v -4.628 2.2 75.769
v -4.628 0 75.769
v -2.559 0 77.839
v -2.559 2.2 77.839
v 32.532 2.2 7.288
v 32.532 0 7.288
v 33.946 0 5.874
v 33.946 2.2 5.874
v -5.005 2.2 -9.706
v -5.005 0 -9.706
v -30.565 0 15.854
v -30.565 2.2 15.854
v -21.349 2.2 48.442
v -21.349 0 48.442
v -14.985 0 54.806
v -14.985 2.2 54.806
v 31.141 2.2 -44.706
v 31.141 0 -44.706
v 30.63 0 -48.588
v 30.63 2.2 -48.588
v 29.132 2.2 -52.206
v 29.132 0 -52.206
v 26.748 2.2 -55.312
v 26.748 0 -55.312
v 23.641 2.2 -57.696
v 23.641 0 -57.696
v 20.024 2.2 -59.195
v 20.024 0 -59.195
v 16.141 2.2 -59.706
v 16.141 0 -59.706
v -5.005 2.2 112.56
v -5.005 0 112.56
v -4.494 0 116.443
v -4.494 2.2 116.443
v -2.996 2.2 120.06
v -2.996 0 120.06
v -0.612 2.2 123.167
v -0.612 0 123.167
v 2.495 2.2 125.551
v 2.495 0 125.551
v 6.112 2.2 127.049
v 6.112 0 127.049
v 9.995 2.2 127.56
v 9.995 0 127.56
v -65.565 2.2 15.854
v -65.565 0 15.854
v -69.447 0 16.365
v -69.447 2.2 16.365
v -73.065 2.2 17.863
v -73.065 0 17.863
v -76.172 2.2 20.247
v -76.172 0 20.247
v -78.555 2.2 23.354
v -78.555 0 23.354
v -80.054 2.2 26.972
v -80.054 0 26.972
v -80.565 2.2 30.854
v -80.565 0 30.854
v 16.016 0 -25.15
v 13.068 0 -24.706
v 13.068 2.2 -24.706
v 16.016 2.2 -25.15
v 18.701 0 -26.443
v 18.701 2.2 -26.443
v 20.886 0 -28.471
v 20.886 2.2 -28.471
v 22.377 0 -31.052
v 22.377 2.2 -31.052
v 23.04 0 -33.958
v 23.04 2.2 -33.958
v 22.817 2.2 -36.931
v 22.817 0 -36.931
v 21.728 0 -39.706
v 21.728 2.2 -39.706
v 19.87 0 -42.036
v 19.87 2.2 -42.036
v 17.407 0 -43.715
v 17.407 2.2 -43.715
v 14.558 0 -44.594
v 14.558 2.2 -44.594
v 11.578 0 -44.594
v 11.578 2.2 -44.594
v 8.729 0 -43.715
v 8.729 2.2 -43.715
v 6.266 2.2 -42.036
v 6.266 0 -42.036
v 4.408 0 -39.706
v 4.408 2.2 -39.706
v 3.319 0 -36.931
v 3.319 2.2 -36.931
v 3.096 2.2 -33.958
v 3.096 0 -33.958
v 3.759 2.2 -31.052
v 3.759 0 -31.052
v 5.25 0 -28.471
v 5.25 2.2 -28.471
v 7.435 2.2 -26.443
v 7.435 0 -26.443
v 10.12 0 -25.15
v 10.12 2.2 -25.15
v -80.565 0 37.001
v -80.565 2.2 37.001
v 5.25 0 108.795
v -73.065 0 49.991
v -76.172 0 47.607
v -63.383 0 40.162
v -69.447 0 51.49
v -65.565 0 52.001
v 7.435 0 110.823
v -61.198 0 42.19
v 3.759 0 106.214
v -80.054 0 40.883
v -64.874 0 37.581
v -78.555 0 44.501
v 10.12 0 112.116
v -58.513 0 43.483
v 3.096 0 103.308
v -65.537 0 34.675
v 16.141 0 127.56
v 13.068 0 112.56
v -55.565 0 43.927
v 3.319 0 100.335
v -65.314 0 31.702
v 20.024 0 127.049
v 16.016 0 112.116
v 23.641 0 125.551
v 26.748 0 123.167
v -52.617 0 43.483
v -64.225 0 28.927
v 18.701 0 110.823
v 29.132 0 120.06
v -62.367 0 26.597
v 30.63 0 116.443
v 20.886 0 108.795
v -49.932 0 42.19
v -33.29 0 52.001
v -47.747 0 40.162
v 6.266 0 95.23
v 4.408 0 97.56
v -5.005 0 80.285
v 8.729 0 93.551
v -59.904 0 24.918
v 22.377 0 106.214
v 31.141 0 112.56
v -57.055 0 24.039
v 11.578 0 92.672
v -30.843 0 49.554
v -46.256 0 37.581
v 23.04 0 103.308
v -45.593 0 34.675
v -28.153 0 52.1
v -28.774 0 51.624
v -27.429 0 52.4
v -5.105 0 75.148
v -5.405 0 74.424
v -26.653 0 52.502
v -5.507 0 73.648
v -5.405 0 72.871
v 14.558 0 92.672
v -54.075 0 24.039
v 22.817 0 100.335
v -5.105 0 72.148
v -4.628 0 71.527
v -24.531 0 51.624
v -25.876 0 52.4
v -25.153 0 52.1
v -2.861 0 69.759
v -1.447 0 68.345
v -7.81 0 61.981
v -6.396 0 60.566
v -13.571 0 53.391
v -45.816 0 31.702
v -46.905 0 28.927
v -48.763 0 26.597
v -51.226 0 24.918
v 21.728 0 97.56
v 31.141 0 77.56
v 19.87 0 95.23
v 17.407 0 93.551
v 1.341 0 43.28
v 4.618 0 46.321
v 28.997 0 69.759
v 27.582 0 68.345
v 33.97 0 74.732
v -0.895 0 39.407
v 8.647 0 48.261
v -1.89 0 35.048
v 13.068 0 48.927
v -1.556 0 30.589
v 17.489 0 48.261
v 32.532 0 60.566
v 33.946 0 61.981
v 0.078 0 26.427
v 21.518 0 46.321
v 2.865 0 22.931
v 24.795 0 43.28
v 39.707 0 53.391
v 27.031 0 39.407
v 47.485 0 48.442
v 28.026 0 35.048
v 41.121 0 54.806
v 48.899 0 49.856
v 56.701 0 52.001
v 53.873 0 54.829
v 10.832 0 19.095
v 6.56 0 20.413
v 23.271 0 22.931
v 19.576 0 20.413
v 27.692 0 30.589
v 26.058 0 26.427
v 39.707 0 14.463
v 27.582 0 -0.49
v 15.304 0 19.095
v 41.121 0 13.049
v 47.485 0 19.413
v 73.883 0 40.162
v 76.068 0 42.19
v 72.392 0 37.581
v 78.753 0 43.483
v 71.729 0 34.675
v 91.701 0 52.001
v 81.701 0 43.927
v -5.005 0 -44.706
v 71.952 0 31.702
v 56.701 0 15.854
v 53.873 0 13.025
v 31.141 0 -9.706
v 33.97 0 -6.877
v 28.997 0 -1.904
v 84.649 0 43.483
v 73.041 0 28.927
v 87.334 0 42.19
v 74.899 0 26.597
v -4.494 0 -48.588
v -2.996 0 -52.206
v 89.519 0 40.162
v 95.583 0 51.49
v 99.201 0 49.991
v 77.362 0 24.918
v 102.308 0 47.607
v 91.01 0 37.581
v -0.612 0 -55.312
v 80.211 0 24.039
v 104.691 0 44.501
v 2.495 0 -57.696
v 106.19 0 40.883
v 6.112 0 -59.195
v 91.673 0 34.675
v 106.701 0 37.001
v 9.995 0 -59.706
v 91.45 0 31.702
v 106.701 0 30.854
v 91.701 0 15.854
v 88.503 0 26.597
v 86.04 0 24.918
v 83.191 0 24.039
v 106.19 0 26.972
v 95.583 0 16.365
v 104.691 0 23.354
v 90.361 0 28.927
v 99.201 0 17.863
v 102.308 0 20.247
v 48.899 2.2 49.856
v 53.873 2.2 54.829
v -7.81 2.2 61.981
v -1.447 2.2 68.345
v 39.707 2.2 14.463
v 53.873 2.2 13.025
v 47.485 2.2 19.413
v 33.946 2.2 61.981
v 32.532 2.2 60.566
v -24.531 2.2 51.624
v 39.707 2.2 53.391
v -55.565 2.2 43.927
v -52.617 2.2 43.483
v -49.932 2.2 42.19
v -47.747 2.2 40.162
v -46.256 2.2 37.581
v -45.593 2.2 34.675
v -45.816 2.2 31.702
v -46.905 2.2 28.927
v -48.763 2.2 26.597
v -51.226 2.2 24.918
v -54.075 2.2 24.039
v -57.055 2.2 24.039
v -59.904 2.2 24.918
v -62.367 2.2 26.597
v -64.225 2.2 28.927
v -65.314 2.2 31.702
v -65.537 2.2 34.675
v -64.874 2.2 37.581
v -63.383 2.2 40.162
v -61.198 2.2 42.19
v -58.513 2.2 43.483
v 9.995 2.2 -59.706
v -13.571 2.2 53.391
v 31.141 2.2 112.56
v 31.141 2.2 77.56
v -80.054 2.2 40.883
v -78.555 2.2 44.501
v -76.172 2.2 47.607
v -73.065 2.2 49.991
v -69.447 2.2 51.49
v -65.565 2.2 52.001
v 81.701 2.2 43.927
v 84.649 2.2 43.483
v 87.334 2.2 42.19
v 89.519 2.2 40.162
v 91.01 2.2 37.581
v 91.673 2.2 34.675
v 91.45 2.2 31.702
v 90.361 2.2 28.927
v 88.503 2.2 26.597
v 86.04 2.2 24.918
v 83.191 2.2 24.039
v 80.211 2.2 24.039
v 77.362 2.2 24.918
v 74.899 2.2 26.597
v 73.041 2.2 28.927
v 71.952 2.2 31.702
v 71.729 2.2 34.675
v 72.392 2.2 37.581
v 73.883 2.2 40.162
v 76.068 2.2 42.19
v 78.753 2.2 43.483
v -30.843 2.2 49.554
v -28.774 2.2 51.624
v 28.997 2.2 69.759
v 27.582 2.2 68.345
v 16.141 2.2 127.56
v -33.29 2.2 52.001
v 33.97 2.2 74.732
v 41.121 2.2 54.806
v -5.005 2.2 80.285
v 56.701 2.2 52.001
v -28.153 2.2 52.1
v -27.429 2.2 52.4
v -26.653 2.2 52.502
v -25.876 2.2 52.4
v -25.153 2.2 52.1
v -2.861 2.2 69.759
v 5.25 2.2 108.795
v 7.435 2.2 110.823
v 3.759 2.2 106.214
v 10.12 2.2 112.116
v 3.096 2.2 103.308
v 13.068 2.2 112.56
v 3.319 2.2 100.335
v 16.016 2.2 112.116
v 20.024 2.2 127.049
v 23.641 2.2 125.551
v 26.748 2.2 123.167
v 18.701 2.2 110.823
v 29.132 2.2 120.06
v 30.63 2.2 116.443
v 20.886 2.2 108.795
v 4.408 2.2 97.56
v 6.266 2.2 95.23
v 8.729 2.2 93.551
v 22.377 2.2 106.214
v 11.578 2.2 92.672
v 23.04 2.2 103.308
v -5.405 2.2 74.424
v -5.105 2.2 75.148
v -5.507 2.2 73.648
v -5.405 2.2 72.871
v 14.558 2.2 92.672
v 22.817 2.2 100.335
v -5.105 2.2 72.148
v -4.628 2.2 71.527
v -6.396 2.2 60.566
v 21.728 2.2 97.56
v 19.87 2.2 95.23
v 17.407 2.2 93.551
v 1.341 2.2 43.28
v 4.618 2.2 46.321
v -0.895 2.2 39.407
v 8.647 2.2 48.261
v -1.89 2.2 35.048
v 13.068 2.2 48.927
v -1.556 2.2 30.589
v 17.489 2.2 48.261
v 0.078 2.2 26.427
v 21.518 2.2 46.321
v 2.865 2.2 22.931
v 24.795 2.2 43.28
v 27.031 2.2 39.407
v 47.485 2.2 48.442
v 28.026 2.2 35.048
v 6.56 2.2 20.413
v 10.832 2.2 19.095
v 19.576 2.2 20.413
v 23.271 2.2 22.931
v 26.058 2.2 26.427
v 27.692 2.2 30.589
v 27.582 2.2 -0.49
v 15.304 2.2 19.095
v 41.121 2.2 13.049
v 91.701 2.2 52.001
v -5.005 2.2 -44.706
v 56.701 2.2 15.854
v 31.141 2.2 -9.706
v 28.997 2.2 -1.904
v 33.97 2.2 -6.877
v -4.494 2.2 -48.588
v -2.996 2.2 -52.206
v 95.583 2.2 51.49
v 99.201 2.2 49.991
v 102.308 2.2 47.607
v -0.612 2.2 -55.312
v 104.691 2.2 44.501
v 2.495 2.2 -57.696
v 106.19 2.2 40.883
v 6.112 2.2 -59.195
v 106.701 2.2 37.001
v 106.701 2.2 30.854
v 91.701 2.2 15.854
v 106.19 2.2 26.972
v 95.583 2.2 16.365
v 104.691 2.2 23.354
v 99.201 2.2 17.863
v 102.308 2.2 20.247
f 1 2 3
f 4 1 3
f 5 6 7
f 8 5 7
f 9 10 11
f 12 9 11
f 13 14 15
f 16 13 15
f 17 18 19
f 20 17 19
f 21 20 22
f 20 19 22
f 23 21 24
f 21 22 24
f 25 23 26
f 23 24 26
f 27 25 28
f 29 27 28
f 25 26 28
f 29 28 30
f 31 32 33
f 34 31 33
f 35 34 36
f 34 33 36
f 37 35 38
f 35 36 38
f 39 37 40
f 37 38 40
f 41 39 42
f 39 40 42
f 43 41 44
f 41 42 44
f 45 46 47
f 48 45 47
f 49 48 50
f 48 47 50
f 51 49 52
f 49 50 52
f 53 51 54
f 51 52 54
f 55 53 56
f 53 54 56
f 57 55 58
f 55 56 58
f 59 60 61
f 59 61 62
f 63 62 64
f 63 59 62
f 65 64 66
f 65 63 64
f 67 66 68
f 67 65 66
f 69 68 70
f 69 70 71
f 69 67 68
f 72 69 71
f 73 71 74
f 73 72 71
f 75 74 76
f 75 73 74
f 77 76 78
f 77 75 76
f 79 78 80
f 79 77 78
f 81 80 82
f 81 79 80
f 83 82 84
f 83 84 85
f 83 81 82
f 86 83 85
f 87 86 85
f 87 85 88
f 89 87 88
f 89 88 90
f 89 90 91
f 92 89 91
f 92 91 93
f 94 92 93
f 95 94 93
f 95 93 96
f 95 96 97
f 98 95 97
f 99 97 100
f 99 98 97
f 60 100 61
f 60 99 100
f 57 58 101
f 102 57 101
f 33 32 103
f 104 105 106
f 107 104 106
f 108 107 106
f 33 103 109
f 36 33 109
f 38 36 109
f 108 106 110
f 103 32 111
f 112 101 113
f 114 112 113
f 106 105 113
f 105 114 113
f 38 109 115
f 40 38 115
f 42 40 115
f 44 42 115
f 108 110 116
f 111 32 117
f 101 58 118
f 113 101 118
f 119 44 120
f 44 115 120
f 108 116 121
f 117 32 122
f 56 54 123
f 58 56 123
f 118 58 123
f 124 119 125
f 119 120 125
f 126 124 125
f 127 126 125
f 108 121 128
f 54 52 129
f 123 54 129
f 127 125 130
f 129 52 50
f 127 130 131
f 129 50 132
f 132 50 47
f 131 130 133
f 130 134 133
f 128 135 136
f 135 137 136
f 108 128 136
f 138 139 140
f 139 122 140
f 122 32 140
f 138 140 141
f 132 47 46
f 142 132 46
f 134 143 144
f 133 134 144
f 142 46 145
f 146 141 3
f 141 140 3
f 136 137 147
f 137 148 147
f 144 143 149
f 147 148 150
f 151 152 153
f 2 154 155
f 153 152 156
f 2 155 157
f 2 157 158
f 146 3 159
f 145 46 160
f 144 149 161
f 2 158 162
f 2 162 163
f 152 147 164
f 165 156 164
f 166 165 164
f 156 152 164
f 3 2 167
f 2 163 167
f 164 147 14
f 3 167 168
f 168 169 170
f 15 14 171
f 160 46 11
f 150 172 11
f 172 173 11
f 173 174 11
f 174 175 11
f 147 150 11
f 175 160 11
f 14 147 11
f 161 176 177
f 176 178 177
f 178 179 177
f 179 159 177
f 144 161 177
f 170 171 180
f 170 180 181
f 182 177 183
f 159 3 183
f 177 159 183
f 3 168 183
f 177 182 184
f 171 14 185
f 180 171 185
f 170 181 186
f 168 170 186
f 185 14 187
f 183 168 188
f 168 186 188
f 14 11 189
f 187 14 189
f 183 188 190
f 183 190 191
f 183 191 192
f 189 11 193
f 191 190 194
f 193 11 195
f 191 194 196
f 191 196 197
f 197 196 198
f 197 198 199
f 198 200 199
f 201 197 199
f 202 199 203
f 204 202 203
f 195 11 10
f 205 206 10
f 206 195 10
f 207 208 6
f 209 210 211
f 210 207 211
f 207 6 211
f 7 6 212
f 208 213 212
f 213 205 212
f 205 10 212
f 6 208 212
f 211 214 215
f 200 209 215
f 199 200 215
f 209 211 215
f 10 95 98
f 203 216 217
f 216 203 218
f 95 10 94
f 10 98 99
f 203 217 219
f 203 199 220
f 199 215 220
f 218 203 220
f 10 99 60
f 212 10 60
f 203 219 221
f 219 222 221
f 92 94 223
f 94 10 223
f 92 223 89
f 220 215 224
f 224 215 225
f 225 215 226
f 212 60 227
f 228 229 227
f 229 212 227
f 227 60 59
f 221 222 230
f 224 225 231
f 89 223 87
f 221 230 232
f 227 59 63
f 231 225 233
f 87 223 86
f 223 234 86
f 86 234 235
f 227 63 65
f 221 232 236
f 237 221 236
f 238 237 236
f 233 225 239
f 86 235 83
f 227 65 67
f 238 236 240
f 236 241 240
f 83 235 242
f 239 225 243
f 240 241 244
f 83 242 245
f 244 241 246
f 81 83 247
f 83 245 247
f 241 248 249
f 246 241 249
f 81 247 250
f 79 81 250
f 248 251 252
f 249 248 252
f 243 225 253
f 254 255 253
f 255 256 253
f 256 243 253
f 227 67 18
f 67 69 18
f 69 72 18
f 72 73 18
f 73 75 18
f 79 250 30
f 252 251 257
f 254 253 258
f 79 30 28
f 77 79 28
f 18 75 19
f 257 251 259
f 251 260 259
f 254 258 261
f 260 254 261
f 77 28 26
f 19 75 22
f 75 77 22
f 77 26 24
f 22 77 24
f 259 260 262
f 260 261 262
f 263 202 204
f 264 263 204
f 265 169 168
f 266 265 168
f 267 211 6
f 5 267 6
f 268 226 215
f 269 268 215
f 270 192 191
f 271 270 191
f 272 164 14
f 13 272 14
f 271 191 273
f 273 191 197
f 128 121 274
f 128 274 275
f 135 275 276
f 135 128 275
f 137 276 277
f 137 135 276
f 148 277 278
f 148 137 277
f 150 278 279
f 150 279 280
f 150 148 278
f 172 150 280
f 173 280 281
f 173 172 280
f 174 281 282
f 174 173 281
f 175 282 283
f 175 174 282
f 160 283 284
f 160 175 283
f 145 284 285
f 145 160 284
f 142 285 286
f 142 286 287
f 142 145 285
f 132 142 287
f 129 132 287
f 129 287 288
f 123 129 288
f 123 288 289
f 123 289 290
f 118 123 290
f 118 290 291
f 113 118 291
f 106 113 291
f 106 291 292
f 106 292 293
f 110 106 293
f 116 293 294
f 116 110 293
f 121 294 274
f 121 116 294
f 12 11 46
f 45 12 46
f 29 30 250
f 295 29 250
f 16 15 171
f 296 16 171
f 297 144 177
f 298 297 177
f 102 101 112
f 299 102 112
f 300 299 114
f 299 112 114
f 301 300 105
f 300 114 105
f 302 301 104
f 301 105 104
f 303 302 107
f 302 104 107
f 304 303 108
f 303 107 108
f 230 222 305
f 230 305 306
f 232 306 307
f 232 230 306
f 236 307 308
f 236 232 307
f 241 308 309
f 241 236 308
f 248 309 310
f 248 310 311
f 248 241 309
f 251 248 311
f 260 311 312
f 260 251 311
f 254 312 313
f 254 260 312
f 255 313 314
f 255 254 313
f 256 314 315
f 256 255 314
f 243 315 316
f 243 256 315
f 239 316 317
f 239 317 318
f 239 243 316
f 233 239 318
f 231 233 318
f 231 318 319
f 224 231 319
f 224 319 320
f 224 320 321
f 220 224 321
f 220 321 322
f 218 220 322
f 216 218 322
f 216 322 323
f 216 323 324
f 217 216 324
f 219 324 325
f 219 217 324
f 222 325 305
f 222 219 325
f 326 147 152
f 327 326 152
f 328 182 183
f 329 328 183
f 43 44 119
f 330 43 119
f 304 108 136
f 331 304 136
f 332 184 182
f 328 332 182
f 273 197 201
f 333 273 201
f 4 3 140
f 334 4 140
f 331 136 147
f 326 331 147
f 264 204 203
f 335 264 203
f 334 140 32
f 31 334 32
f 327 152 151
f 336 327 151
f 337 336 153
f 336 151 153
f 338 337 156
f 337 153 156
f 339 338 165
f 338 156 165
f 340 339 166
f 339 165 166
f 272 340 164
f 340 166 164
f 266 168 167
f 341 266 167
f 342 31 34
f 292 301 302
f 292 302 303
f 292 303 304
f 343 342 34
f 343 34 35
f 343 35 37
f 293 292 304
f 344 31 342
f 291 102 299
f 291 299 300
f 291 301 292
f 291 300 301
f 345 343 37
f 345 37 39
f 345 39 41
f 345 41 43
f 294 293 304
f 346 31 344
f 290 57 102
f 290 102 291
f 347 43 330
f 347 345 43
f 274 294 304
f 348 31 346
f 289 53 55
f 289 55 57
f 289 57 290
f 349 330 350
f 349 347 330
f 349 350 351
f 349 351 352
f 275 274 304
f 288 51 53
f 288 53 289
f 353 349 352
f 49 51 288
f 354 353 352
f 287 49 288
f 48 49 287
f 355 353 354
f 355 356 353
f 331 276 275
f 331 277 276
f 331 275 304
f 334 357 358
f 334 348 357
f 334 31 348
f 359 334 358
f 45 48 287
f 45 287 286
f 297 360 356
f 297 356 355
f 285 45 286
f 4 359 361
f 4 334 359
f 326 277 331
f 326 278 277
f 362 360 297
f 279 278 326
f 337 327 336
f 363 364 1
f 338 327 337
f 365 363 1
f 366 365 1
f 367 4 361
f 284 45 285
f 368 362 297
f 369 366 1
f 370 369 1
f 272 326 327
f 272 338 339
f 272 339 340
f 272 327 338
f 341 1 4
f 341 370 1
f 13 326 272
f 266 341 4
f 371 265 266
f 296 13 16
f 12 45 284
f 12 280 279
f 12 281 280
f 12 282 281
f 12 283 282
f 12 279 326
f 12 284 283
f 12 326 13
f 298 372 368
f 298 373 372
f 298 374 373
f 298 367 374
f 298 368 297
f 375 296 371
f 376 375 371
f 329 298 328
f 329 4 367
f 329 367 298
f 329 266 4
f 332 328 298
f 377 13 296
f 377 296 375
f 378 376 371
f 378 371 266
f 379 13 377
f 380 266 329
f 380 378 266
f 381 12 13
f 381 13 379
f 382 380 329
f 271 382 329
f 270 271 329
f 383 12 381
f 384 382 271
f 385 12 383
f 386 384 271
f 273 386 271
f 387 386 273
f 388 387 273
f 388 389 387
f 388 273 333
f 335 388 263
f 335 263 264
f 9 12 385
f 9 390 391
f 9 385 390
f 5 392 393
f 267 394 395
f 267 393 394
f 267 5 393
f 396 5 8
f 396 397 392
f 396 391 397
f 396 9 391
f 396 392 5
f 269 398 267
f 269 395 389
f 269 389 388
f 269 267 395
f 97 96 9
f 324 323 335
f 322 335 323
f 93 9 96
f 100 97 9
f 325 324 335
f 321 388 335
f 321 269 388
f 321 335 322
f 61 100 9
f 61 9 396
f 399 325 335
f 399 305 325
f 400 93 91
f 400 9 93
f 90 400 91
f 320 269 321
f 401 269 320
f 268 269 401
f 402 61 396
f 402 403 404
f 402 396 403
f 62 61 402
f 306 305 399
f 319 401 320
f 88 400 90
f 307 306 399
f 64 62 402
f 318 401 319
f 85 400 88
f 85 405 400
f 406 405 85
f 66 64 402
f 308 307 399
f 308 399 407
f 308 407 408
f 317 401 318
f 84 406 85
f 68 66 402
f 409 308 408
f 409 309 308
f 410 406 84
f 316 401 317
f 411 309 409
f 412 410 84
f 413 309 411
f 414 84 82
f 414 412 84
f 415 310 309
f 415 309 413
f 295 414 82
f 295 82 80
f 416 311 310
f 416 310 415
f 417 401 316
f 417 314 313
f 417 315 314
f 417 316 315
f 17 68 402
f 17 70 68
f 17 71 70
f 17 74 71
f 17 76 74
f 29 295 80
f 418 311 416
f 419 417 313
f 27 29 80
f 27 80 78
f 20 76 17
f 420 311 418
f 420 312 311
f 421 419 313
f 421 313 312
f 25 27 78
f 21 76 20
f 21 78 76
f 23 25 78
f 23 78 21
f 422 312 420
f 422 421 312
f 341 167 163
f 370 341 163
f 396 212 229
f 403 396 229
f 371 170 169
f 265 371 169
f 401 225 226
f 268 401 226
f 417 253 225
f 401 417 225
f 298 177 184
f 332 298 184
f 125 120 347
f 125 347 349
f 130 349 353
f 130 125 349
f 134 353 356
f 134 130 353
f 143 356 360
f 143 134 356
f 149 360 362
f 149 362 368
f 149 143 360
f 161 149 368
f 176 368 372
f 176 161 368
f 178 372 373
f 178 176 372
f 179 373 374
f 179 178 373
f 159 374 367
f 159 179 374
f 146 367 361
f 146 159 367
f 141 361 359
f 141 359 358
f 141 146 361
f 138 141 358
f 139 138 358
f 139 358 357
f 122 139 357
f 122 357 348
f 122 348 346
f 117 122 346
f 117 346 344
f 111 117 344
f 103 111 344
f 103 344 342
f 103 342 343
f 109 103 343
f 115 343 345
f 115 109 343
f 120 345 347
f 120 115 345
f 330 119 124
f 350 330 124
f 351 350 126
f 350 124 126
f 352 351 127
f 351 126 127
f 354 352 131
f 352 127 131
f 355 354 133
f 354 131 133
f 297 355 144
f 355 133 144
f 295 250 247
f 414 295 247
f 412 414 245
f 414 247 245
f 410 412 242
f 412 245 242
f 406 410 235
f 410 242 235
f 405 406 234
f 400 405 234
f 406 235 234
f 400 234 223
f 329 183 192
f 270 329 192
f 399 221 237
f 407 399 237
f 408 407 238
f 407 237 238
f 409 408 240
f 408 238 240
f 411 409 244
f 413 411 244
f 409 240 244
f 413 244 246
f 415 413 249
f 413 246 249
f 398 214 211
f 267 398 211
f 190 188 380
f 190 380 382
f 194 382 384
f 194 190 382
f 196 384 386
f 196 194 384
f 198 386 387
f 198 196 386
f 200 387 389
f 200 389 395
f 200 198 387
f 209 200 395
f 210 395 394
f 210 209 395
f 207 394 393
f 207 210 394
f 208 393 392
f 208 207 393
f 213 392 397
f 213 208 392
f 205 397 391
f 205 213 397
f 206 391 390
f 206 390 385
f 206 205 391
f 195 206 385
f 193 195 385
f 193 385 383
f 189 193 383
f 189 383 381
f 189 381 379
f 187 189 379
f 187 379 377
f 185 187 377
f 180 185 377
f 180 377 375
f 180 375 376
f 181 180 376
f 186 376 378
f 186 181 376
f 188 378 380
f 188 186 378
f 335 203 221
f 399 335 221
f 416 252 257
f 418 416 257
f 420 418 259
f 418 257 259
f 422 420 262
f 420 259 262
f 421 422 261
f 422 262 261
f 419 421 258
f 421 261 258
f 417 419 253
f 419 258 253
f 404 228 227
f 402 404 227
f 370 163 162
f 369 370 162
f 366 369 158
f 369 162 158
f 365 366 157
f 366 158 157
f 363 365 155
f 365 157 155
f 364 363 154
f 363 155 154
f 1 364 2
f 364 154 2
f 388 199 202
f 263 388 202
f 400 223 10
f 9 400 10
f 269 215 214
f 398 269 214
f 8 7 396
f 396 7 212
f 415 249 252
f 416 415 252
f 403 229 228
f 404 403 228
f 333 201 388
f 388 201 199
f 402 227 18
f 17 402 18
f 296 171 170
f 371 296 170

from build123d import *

# Parameters (mm, degrees)
SKETCH1_R           = 10
SKETCH1_R_2         = 15
BOSS_EXTRUDE1_DEPTH = 2.2


with BuildPart() as part:
    # Sketch1 → Boss-Extrude1 (new body)
    with BuildSketch(Plane(origin=(0, 0, 0), x_dir=(1, 0, 0), z_dir=(0, 1, 0))):
        with BuildLine():
            Line((28.996705531, 1.904265459), (33.969810226, 6.877370153))
            Line((33.969810226, 6.877370153), (31.141383101, 9.705797278))
            Line((31.141383101, 9.705797278), (31.141383101, 44.705797278))
            ThreePointArc((31.141383101, 44.705797278), (26.747984819, 55.312398995), (16.141383101, 59.705797278))
            Line((16.141383101, 59.705797278), (9.99459577, 59.705797278))
            ThreePointArc((9.99459577, 59.705797278), (-0.612005948, 55.312398995), (-5.00540423, 44.705797278))
            Line((-5.00540423, 44.705797278), (-5.00540423, 9.705797278))
            Line((-5.00540423, 9.705797278), (-30.56504267, -15.853841163))
            Line((-30.56504267, -15.853841163), (-65.56504267, -15.853841163))
            ThreePointArc((-65.56504267, -15.853841163), (-76.171644388, -20.247239445), (-80.56504267, -30.853841163))
            Line((-80.56504267, -30.853841163), (-80.56504267, -37.000628494))
            ThreePointArc((-80.56504267, -37.000628494), (-76.171644388, -47.607230212), (-65.56504267, -52.000628494))
            Line((-65.56504267, -52.000628494), (-33.289675478, -52.000628494))
            Line((-33.289675478, -52.000628494), (-30.843341676, -49.554294692))
            Line((-30.843341676, -49.554294692), (-28.773918492, -51.623717877))
            ThreePointArc((-28.773918492, -51.623717877), (-26.652598148, -52.502397534), (-24.531277804, -51.623717877))
            Line((-24.531277804, -51.623717877), (-22.763510851, -49.855950924))
            Line((-22.763510851, -49.855950924), (-21.349297289, -48.441737362))
            Line((-21.349297289, -48.441737362), (-14.985336258, -54.805698393))
            Line((-14.985336258, -54.805698393), (-13.571122696, -53.39148483))
            Line((-13.571122696, -53.39148483), (-6.396260567, -60.566346959))
            Line((-6.396260567, -60.566346959), (-7.810474129, -61.980560522))
            Line((-7.810474129, -61.980560522), (-1.446513098, -68.344521553))
            Line((-1.446513098, -68.344521553), (-2.860726661, -69.758735115))
            Line((-2.860726661, -69.758735115), (-4.628493614, -71.526502068))
            ThreePointArc((-4.628493614, -71.526502068), (-5.50717327, -73.647822411), (-4.628493614, -75.769142755))
            Line((-4.628493614, -75.769142755), (-2.559070429, -77.83856594))
            Line((-2.559070429, -77.83856594), (-5.00540423, -80.284899741))
            Line((-5.00540423, -80.284899741), (-5.00540423, -112.560266934))
            ThreePointArc((-5.00540423, -112.560266934), (-0.612005948, -123.166868652), (9.99459577, -127.560266934))
            Line((9.99459577, -127.560266934), (16.141383101, -127.560266934))
            ThreePointArc((16.141383101, -127.560266934), (26.747984819, -123.166868652), (31.141383101, -112.560266934))
            Line((31.141383101, -112.560266934), (31.141383101, -77.560266934))
            Line((31.141383101, -77.560266934), (33.969810226, -74.731839809))
            Line((33.969810226, -74.731839809), (28.996705531, -69.758735115))
            Line((28.996705531, -69.758735115), (27.582491969, -68.344521553))
            Line((27.582491969, -68.344521553), (33.946453, -61.980560522))
            Line((33.946453, -61.980560522), (32.532239437, -60.566346959))
            Line((32.532239437, -60.566346959), (39.707101567, -53.39148483))
            Line((39.707101567, -53.39148483), (41.121315129, -54.805698393))
            Line((41.121315129, -54.805698393), (47.48527616, -48.441737362))
            Line((47.48527616, -48.441737362), (48.899489722, -49.855950924))
            Line((48.899489722, -49.855950924), (53.872594416, -54.829055619))
            Line((53.872594416, -54.829055619), (56.701021541, -52.000628494))
            Line((56.701021541, -52.000628494), (91.701021541, -52.000628494))
            ThreePointArc((91.701021541, -52.000628494), (102.307623259, -47.607230212), (106.701021541, -37.000628494))
            Line((106.701021541, -37.000628494), (106.701021541, -30.853841163))
            ThreePointArc((106.701021541, -30.853841163), (102.307623259, -20.247239445), (91.701021541, -15.853841163))
            Line((91.701021541, -15.853841163), (56.701021541, -15.853841163))
            Line((56.701021541, -15.853841163), (53.872594416, -13.025414038))
            Line((53.872594416, -13.025414038), (48.899489722, -17.998518732))
            Line((48.899489722, -17.998518732), (47.48527616, -19.412732294))
            Line((47.48527616, -19.412732294), (41.121315129, -13.048771264))
            Line((41.121315129, -13.048771264), (39.707101567, -14.462984826))
            Line((39.707101567, -14.462984826), (32.532239437, -7.288122697))
            Line((32.532239437, -7.288122697), (33.946453, -5.873909135))
            Line((33.946453, -5.873909135), (27.582491969, 0.490051896))
            Line((27.582491969, 0.490051896), (28.996705531, 1.904265459))
        make_face()
        with Locations(Location((-55.56504267, -33.927234828, 0), (0, 0, 270))):
            Circle(SKETCH1_R, mode=Mode.SUBTRACT)
        with Locations(Location((13.067989435, -102.560266934, 0), (0, 0, 270))):
            Circle(SKETCH1_R, mode=Mode.SUBTRACT)
        with Locations(Location((13.067989435, -33.927234828, 0), (0, 0, 270))):
            Circle(SKETCH1_R_2, mode=Mode.SUBTRACT)
        with Locations(Location((81.701021541, -33.927234828, 0), (0, 0, 270))):
            Circle(SKETCH1_R, mode=Mode.SUBTRACT)
        with Locations(Location((13.067989435, 34.705797278, 0), (0, 0, 270))):
            Circle(SKETCH1_R, mode=Mode.SUBTRACT)
    extrude(amount=BOSS_EXTRUDE1_DEPTH)


solid = part.part
